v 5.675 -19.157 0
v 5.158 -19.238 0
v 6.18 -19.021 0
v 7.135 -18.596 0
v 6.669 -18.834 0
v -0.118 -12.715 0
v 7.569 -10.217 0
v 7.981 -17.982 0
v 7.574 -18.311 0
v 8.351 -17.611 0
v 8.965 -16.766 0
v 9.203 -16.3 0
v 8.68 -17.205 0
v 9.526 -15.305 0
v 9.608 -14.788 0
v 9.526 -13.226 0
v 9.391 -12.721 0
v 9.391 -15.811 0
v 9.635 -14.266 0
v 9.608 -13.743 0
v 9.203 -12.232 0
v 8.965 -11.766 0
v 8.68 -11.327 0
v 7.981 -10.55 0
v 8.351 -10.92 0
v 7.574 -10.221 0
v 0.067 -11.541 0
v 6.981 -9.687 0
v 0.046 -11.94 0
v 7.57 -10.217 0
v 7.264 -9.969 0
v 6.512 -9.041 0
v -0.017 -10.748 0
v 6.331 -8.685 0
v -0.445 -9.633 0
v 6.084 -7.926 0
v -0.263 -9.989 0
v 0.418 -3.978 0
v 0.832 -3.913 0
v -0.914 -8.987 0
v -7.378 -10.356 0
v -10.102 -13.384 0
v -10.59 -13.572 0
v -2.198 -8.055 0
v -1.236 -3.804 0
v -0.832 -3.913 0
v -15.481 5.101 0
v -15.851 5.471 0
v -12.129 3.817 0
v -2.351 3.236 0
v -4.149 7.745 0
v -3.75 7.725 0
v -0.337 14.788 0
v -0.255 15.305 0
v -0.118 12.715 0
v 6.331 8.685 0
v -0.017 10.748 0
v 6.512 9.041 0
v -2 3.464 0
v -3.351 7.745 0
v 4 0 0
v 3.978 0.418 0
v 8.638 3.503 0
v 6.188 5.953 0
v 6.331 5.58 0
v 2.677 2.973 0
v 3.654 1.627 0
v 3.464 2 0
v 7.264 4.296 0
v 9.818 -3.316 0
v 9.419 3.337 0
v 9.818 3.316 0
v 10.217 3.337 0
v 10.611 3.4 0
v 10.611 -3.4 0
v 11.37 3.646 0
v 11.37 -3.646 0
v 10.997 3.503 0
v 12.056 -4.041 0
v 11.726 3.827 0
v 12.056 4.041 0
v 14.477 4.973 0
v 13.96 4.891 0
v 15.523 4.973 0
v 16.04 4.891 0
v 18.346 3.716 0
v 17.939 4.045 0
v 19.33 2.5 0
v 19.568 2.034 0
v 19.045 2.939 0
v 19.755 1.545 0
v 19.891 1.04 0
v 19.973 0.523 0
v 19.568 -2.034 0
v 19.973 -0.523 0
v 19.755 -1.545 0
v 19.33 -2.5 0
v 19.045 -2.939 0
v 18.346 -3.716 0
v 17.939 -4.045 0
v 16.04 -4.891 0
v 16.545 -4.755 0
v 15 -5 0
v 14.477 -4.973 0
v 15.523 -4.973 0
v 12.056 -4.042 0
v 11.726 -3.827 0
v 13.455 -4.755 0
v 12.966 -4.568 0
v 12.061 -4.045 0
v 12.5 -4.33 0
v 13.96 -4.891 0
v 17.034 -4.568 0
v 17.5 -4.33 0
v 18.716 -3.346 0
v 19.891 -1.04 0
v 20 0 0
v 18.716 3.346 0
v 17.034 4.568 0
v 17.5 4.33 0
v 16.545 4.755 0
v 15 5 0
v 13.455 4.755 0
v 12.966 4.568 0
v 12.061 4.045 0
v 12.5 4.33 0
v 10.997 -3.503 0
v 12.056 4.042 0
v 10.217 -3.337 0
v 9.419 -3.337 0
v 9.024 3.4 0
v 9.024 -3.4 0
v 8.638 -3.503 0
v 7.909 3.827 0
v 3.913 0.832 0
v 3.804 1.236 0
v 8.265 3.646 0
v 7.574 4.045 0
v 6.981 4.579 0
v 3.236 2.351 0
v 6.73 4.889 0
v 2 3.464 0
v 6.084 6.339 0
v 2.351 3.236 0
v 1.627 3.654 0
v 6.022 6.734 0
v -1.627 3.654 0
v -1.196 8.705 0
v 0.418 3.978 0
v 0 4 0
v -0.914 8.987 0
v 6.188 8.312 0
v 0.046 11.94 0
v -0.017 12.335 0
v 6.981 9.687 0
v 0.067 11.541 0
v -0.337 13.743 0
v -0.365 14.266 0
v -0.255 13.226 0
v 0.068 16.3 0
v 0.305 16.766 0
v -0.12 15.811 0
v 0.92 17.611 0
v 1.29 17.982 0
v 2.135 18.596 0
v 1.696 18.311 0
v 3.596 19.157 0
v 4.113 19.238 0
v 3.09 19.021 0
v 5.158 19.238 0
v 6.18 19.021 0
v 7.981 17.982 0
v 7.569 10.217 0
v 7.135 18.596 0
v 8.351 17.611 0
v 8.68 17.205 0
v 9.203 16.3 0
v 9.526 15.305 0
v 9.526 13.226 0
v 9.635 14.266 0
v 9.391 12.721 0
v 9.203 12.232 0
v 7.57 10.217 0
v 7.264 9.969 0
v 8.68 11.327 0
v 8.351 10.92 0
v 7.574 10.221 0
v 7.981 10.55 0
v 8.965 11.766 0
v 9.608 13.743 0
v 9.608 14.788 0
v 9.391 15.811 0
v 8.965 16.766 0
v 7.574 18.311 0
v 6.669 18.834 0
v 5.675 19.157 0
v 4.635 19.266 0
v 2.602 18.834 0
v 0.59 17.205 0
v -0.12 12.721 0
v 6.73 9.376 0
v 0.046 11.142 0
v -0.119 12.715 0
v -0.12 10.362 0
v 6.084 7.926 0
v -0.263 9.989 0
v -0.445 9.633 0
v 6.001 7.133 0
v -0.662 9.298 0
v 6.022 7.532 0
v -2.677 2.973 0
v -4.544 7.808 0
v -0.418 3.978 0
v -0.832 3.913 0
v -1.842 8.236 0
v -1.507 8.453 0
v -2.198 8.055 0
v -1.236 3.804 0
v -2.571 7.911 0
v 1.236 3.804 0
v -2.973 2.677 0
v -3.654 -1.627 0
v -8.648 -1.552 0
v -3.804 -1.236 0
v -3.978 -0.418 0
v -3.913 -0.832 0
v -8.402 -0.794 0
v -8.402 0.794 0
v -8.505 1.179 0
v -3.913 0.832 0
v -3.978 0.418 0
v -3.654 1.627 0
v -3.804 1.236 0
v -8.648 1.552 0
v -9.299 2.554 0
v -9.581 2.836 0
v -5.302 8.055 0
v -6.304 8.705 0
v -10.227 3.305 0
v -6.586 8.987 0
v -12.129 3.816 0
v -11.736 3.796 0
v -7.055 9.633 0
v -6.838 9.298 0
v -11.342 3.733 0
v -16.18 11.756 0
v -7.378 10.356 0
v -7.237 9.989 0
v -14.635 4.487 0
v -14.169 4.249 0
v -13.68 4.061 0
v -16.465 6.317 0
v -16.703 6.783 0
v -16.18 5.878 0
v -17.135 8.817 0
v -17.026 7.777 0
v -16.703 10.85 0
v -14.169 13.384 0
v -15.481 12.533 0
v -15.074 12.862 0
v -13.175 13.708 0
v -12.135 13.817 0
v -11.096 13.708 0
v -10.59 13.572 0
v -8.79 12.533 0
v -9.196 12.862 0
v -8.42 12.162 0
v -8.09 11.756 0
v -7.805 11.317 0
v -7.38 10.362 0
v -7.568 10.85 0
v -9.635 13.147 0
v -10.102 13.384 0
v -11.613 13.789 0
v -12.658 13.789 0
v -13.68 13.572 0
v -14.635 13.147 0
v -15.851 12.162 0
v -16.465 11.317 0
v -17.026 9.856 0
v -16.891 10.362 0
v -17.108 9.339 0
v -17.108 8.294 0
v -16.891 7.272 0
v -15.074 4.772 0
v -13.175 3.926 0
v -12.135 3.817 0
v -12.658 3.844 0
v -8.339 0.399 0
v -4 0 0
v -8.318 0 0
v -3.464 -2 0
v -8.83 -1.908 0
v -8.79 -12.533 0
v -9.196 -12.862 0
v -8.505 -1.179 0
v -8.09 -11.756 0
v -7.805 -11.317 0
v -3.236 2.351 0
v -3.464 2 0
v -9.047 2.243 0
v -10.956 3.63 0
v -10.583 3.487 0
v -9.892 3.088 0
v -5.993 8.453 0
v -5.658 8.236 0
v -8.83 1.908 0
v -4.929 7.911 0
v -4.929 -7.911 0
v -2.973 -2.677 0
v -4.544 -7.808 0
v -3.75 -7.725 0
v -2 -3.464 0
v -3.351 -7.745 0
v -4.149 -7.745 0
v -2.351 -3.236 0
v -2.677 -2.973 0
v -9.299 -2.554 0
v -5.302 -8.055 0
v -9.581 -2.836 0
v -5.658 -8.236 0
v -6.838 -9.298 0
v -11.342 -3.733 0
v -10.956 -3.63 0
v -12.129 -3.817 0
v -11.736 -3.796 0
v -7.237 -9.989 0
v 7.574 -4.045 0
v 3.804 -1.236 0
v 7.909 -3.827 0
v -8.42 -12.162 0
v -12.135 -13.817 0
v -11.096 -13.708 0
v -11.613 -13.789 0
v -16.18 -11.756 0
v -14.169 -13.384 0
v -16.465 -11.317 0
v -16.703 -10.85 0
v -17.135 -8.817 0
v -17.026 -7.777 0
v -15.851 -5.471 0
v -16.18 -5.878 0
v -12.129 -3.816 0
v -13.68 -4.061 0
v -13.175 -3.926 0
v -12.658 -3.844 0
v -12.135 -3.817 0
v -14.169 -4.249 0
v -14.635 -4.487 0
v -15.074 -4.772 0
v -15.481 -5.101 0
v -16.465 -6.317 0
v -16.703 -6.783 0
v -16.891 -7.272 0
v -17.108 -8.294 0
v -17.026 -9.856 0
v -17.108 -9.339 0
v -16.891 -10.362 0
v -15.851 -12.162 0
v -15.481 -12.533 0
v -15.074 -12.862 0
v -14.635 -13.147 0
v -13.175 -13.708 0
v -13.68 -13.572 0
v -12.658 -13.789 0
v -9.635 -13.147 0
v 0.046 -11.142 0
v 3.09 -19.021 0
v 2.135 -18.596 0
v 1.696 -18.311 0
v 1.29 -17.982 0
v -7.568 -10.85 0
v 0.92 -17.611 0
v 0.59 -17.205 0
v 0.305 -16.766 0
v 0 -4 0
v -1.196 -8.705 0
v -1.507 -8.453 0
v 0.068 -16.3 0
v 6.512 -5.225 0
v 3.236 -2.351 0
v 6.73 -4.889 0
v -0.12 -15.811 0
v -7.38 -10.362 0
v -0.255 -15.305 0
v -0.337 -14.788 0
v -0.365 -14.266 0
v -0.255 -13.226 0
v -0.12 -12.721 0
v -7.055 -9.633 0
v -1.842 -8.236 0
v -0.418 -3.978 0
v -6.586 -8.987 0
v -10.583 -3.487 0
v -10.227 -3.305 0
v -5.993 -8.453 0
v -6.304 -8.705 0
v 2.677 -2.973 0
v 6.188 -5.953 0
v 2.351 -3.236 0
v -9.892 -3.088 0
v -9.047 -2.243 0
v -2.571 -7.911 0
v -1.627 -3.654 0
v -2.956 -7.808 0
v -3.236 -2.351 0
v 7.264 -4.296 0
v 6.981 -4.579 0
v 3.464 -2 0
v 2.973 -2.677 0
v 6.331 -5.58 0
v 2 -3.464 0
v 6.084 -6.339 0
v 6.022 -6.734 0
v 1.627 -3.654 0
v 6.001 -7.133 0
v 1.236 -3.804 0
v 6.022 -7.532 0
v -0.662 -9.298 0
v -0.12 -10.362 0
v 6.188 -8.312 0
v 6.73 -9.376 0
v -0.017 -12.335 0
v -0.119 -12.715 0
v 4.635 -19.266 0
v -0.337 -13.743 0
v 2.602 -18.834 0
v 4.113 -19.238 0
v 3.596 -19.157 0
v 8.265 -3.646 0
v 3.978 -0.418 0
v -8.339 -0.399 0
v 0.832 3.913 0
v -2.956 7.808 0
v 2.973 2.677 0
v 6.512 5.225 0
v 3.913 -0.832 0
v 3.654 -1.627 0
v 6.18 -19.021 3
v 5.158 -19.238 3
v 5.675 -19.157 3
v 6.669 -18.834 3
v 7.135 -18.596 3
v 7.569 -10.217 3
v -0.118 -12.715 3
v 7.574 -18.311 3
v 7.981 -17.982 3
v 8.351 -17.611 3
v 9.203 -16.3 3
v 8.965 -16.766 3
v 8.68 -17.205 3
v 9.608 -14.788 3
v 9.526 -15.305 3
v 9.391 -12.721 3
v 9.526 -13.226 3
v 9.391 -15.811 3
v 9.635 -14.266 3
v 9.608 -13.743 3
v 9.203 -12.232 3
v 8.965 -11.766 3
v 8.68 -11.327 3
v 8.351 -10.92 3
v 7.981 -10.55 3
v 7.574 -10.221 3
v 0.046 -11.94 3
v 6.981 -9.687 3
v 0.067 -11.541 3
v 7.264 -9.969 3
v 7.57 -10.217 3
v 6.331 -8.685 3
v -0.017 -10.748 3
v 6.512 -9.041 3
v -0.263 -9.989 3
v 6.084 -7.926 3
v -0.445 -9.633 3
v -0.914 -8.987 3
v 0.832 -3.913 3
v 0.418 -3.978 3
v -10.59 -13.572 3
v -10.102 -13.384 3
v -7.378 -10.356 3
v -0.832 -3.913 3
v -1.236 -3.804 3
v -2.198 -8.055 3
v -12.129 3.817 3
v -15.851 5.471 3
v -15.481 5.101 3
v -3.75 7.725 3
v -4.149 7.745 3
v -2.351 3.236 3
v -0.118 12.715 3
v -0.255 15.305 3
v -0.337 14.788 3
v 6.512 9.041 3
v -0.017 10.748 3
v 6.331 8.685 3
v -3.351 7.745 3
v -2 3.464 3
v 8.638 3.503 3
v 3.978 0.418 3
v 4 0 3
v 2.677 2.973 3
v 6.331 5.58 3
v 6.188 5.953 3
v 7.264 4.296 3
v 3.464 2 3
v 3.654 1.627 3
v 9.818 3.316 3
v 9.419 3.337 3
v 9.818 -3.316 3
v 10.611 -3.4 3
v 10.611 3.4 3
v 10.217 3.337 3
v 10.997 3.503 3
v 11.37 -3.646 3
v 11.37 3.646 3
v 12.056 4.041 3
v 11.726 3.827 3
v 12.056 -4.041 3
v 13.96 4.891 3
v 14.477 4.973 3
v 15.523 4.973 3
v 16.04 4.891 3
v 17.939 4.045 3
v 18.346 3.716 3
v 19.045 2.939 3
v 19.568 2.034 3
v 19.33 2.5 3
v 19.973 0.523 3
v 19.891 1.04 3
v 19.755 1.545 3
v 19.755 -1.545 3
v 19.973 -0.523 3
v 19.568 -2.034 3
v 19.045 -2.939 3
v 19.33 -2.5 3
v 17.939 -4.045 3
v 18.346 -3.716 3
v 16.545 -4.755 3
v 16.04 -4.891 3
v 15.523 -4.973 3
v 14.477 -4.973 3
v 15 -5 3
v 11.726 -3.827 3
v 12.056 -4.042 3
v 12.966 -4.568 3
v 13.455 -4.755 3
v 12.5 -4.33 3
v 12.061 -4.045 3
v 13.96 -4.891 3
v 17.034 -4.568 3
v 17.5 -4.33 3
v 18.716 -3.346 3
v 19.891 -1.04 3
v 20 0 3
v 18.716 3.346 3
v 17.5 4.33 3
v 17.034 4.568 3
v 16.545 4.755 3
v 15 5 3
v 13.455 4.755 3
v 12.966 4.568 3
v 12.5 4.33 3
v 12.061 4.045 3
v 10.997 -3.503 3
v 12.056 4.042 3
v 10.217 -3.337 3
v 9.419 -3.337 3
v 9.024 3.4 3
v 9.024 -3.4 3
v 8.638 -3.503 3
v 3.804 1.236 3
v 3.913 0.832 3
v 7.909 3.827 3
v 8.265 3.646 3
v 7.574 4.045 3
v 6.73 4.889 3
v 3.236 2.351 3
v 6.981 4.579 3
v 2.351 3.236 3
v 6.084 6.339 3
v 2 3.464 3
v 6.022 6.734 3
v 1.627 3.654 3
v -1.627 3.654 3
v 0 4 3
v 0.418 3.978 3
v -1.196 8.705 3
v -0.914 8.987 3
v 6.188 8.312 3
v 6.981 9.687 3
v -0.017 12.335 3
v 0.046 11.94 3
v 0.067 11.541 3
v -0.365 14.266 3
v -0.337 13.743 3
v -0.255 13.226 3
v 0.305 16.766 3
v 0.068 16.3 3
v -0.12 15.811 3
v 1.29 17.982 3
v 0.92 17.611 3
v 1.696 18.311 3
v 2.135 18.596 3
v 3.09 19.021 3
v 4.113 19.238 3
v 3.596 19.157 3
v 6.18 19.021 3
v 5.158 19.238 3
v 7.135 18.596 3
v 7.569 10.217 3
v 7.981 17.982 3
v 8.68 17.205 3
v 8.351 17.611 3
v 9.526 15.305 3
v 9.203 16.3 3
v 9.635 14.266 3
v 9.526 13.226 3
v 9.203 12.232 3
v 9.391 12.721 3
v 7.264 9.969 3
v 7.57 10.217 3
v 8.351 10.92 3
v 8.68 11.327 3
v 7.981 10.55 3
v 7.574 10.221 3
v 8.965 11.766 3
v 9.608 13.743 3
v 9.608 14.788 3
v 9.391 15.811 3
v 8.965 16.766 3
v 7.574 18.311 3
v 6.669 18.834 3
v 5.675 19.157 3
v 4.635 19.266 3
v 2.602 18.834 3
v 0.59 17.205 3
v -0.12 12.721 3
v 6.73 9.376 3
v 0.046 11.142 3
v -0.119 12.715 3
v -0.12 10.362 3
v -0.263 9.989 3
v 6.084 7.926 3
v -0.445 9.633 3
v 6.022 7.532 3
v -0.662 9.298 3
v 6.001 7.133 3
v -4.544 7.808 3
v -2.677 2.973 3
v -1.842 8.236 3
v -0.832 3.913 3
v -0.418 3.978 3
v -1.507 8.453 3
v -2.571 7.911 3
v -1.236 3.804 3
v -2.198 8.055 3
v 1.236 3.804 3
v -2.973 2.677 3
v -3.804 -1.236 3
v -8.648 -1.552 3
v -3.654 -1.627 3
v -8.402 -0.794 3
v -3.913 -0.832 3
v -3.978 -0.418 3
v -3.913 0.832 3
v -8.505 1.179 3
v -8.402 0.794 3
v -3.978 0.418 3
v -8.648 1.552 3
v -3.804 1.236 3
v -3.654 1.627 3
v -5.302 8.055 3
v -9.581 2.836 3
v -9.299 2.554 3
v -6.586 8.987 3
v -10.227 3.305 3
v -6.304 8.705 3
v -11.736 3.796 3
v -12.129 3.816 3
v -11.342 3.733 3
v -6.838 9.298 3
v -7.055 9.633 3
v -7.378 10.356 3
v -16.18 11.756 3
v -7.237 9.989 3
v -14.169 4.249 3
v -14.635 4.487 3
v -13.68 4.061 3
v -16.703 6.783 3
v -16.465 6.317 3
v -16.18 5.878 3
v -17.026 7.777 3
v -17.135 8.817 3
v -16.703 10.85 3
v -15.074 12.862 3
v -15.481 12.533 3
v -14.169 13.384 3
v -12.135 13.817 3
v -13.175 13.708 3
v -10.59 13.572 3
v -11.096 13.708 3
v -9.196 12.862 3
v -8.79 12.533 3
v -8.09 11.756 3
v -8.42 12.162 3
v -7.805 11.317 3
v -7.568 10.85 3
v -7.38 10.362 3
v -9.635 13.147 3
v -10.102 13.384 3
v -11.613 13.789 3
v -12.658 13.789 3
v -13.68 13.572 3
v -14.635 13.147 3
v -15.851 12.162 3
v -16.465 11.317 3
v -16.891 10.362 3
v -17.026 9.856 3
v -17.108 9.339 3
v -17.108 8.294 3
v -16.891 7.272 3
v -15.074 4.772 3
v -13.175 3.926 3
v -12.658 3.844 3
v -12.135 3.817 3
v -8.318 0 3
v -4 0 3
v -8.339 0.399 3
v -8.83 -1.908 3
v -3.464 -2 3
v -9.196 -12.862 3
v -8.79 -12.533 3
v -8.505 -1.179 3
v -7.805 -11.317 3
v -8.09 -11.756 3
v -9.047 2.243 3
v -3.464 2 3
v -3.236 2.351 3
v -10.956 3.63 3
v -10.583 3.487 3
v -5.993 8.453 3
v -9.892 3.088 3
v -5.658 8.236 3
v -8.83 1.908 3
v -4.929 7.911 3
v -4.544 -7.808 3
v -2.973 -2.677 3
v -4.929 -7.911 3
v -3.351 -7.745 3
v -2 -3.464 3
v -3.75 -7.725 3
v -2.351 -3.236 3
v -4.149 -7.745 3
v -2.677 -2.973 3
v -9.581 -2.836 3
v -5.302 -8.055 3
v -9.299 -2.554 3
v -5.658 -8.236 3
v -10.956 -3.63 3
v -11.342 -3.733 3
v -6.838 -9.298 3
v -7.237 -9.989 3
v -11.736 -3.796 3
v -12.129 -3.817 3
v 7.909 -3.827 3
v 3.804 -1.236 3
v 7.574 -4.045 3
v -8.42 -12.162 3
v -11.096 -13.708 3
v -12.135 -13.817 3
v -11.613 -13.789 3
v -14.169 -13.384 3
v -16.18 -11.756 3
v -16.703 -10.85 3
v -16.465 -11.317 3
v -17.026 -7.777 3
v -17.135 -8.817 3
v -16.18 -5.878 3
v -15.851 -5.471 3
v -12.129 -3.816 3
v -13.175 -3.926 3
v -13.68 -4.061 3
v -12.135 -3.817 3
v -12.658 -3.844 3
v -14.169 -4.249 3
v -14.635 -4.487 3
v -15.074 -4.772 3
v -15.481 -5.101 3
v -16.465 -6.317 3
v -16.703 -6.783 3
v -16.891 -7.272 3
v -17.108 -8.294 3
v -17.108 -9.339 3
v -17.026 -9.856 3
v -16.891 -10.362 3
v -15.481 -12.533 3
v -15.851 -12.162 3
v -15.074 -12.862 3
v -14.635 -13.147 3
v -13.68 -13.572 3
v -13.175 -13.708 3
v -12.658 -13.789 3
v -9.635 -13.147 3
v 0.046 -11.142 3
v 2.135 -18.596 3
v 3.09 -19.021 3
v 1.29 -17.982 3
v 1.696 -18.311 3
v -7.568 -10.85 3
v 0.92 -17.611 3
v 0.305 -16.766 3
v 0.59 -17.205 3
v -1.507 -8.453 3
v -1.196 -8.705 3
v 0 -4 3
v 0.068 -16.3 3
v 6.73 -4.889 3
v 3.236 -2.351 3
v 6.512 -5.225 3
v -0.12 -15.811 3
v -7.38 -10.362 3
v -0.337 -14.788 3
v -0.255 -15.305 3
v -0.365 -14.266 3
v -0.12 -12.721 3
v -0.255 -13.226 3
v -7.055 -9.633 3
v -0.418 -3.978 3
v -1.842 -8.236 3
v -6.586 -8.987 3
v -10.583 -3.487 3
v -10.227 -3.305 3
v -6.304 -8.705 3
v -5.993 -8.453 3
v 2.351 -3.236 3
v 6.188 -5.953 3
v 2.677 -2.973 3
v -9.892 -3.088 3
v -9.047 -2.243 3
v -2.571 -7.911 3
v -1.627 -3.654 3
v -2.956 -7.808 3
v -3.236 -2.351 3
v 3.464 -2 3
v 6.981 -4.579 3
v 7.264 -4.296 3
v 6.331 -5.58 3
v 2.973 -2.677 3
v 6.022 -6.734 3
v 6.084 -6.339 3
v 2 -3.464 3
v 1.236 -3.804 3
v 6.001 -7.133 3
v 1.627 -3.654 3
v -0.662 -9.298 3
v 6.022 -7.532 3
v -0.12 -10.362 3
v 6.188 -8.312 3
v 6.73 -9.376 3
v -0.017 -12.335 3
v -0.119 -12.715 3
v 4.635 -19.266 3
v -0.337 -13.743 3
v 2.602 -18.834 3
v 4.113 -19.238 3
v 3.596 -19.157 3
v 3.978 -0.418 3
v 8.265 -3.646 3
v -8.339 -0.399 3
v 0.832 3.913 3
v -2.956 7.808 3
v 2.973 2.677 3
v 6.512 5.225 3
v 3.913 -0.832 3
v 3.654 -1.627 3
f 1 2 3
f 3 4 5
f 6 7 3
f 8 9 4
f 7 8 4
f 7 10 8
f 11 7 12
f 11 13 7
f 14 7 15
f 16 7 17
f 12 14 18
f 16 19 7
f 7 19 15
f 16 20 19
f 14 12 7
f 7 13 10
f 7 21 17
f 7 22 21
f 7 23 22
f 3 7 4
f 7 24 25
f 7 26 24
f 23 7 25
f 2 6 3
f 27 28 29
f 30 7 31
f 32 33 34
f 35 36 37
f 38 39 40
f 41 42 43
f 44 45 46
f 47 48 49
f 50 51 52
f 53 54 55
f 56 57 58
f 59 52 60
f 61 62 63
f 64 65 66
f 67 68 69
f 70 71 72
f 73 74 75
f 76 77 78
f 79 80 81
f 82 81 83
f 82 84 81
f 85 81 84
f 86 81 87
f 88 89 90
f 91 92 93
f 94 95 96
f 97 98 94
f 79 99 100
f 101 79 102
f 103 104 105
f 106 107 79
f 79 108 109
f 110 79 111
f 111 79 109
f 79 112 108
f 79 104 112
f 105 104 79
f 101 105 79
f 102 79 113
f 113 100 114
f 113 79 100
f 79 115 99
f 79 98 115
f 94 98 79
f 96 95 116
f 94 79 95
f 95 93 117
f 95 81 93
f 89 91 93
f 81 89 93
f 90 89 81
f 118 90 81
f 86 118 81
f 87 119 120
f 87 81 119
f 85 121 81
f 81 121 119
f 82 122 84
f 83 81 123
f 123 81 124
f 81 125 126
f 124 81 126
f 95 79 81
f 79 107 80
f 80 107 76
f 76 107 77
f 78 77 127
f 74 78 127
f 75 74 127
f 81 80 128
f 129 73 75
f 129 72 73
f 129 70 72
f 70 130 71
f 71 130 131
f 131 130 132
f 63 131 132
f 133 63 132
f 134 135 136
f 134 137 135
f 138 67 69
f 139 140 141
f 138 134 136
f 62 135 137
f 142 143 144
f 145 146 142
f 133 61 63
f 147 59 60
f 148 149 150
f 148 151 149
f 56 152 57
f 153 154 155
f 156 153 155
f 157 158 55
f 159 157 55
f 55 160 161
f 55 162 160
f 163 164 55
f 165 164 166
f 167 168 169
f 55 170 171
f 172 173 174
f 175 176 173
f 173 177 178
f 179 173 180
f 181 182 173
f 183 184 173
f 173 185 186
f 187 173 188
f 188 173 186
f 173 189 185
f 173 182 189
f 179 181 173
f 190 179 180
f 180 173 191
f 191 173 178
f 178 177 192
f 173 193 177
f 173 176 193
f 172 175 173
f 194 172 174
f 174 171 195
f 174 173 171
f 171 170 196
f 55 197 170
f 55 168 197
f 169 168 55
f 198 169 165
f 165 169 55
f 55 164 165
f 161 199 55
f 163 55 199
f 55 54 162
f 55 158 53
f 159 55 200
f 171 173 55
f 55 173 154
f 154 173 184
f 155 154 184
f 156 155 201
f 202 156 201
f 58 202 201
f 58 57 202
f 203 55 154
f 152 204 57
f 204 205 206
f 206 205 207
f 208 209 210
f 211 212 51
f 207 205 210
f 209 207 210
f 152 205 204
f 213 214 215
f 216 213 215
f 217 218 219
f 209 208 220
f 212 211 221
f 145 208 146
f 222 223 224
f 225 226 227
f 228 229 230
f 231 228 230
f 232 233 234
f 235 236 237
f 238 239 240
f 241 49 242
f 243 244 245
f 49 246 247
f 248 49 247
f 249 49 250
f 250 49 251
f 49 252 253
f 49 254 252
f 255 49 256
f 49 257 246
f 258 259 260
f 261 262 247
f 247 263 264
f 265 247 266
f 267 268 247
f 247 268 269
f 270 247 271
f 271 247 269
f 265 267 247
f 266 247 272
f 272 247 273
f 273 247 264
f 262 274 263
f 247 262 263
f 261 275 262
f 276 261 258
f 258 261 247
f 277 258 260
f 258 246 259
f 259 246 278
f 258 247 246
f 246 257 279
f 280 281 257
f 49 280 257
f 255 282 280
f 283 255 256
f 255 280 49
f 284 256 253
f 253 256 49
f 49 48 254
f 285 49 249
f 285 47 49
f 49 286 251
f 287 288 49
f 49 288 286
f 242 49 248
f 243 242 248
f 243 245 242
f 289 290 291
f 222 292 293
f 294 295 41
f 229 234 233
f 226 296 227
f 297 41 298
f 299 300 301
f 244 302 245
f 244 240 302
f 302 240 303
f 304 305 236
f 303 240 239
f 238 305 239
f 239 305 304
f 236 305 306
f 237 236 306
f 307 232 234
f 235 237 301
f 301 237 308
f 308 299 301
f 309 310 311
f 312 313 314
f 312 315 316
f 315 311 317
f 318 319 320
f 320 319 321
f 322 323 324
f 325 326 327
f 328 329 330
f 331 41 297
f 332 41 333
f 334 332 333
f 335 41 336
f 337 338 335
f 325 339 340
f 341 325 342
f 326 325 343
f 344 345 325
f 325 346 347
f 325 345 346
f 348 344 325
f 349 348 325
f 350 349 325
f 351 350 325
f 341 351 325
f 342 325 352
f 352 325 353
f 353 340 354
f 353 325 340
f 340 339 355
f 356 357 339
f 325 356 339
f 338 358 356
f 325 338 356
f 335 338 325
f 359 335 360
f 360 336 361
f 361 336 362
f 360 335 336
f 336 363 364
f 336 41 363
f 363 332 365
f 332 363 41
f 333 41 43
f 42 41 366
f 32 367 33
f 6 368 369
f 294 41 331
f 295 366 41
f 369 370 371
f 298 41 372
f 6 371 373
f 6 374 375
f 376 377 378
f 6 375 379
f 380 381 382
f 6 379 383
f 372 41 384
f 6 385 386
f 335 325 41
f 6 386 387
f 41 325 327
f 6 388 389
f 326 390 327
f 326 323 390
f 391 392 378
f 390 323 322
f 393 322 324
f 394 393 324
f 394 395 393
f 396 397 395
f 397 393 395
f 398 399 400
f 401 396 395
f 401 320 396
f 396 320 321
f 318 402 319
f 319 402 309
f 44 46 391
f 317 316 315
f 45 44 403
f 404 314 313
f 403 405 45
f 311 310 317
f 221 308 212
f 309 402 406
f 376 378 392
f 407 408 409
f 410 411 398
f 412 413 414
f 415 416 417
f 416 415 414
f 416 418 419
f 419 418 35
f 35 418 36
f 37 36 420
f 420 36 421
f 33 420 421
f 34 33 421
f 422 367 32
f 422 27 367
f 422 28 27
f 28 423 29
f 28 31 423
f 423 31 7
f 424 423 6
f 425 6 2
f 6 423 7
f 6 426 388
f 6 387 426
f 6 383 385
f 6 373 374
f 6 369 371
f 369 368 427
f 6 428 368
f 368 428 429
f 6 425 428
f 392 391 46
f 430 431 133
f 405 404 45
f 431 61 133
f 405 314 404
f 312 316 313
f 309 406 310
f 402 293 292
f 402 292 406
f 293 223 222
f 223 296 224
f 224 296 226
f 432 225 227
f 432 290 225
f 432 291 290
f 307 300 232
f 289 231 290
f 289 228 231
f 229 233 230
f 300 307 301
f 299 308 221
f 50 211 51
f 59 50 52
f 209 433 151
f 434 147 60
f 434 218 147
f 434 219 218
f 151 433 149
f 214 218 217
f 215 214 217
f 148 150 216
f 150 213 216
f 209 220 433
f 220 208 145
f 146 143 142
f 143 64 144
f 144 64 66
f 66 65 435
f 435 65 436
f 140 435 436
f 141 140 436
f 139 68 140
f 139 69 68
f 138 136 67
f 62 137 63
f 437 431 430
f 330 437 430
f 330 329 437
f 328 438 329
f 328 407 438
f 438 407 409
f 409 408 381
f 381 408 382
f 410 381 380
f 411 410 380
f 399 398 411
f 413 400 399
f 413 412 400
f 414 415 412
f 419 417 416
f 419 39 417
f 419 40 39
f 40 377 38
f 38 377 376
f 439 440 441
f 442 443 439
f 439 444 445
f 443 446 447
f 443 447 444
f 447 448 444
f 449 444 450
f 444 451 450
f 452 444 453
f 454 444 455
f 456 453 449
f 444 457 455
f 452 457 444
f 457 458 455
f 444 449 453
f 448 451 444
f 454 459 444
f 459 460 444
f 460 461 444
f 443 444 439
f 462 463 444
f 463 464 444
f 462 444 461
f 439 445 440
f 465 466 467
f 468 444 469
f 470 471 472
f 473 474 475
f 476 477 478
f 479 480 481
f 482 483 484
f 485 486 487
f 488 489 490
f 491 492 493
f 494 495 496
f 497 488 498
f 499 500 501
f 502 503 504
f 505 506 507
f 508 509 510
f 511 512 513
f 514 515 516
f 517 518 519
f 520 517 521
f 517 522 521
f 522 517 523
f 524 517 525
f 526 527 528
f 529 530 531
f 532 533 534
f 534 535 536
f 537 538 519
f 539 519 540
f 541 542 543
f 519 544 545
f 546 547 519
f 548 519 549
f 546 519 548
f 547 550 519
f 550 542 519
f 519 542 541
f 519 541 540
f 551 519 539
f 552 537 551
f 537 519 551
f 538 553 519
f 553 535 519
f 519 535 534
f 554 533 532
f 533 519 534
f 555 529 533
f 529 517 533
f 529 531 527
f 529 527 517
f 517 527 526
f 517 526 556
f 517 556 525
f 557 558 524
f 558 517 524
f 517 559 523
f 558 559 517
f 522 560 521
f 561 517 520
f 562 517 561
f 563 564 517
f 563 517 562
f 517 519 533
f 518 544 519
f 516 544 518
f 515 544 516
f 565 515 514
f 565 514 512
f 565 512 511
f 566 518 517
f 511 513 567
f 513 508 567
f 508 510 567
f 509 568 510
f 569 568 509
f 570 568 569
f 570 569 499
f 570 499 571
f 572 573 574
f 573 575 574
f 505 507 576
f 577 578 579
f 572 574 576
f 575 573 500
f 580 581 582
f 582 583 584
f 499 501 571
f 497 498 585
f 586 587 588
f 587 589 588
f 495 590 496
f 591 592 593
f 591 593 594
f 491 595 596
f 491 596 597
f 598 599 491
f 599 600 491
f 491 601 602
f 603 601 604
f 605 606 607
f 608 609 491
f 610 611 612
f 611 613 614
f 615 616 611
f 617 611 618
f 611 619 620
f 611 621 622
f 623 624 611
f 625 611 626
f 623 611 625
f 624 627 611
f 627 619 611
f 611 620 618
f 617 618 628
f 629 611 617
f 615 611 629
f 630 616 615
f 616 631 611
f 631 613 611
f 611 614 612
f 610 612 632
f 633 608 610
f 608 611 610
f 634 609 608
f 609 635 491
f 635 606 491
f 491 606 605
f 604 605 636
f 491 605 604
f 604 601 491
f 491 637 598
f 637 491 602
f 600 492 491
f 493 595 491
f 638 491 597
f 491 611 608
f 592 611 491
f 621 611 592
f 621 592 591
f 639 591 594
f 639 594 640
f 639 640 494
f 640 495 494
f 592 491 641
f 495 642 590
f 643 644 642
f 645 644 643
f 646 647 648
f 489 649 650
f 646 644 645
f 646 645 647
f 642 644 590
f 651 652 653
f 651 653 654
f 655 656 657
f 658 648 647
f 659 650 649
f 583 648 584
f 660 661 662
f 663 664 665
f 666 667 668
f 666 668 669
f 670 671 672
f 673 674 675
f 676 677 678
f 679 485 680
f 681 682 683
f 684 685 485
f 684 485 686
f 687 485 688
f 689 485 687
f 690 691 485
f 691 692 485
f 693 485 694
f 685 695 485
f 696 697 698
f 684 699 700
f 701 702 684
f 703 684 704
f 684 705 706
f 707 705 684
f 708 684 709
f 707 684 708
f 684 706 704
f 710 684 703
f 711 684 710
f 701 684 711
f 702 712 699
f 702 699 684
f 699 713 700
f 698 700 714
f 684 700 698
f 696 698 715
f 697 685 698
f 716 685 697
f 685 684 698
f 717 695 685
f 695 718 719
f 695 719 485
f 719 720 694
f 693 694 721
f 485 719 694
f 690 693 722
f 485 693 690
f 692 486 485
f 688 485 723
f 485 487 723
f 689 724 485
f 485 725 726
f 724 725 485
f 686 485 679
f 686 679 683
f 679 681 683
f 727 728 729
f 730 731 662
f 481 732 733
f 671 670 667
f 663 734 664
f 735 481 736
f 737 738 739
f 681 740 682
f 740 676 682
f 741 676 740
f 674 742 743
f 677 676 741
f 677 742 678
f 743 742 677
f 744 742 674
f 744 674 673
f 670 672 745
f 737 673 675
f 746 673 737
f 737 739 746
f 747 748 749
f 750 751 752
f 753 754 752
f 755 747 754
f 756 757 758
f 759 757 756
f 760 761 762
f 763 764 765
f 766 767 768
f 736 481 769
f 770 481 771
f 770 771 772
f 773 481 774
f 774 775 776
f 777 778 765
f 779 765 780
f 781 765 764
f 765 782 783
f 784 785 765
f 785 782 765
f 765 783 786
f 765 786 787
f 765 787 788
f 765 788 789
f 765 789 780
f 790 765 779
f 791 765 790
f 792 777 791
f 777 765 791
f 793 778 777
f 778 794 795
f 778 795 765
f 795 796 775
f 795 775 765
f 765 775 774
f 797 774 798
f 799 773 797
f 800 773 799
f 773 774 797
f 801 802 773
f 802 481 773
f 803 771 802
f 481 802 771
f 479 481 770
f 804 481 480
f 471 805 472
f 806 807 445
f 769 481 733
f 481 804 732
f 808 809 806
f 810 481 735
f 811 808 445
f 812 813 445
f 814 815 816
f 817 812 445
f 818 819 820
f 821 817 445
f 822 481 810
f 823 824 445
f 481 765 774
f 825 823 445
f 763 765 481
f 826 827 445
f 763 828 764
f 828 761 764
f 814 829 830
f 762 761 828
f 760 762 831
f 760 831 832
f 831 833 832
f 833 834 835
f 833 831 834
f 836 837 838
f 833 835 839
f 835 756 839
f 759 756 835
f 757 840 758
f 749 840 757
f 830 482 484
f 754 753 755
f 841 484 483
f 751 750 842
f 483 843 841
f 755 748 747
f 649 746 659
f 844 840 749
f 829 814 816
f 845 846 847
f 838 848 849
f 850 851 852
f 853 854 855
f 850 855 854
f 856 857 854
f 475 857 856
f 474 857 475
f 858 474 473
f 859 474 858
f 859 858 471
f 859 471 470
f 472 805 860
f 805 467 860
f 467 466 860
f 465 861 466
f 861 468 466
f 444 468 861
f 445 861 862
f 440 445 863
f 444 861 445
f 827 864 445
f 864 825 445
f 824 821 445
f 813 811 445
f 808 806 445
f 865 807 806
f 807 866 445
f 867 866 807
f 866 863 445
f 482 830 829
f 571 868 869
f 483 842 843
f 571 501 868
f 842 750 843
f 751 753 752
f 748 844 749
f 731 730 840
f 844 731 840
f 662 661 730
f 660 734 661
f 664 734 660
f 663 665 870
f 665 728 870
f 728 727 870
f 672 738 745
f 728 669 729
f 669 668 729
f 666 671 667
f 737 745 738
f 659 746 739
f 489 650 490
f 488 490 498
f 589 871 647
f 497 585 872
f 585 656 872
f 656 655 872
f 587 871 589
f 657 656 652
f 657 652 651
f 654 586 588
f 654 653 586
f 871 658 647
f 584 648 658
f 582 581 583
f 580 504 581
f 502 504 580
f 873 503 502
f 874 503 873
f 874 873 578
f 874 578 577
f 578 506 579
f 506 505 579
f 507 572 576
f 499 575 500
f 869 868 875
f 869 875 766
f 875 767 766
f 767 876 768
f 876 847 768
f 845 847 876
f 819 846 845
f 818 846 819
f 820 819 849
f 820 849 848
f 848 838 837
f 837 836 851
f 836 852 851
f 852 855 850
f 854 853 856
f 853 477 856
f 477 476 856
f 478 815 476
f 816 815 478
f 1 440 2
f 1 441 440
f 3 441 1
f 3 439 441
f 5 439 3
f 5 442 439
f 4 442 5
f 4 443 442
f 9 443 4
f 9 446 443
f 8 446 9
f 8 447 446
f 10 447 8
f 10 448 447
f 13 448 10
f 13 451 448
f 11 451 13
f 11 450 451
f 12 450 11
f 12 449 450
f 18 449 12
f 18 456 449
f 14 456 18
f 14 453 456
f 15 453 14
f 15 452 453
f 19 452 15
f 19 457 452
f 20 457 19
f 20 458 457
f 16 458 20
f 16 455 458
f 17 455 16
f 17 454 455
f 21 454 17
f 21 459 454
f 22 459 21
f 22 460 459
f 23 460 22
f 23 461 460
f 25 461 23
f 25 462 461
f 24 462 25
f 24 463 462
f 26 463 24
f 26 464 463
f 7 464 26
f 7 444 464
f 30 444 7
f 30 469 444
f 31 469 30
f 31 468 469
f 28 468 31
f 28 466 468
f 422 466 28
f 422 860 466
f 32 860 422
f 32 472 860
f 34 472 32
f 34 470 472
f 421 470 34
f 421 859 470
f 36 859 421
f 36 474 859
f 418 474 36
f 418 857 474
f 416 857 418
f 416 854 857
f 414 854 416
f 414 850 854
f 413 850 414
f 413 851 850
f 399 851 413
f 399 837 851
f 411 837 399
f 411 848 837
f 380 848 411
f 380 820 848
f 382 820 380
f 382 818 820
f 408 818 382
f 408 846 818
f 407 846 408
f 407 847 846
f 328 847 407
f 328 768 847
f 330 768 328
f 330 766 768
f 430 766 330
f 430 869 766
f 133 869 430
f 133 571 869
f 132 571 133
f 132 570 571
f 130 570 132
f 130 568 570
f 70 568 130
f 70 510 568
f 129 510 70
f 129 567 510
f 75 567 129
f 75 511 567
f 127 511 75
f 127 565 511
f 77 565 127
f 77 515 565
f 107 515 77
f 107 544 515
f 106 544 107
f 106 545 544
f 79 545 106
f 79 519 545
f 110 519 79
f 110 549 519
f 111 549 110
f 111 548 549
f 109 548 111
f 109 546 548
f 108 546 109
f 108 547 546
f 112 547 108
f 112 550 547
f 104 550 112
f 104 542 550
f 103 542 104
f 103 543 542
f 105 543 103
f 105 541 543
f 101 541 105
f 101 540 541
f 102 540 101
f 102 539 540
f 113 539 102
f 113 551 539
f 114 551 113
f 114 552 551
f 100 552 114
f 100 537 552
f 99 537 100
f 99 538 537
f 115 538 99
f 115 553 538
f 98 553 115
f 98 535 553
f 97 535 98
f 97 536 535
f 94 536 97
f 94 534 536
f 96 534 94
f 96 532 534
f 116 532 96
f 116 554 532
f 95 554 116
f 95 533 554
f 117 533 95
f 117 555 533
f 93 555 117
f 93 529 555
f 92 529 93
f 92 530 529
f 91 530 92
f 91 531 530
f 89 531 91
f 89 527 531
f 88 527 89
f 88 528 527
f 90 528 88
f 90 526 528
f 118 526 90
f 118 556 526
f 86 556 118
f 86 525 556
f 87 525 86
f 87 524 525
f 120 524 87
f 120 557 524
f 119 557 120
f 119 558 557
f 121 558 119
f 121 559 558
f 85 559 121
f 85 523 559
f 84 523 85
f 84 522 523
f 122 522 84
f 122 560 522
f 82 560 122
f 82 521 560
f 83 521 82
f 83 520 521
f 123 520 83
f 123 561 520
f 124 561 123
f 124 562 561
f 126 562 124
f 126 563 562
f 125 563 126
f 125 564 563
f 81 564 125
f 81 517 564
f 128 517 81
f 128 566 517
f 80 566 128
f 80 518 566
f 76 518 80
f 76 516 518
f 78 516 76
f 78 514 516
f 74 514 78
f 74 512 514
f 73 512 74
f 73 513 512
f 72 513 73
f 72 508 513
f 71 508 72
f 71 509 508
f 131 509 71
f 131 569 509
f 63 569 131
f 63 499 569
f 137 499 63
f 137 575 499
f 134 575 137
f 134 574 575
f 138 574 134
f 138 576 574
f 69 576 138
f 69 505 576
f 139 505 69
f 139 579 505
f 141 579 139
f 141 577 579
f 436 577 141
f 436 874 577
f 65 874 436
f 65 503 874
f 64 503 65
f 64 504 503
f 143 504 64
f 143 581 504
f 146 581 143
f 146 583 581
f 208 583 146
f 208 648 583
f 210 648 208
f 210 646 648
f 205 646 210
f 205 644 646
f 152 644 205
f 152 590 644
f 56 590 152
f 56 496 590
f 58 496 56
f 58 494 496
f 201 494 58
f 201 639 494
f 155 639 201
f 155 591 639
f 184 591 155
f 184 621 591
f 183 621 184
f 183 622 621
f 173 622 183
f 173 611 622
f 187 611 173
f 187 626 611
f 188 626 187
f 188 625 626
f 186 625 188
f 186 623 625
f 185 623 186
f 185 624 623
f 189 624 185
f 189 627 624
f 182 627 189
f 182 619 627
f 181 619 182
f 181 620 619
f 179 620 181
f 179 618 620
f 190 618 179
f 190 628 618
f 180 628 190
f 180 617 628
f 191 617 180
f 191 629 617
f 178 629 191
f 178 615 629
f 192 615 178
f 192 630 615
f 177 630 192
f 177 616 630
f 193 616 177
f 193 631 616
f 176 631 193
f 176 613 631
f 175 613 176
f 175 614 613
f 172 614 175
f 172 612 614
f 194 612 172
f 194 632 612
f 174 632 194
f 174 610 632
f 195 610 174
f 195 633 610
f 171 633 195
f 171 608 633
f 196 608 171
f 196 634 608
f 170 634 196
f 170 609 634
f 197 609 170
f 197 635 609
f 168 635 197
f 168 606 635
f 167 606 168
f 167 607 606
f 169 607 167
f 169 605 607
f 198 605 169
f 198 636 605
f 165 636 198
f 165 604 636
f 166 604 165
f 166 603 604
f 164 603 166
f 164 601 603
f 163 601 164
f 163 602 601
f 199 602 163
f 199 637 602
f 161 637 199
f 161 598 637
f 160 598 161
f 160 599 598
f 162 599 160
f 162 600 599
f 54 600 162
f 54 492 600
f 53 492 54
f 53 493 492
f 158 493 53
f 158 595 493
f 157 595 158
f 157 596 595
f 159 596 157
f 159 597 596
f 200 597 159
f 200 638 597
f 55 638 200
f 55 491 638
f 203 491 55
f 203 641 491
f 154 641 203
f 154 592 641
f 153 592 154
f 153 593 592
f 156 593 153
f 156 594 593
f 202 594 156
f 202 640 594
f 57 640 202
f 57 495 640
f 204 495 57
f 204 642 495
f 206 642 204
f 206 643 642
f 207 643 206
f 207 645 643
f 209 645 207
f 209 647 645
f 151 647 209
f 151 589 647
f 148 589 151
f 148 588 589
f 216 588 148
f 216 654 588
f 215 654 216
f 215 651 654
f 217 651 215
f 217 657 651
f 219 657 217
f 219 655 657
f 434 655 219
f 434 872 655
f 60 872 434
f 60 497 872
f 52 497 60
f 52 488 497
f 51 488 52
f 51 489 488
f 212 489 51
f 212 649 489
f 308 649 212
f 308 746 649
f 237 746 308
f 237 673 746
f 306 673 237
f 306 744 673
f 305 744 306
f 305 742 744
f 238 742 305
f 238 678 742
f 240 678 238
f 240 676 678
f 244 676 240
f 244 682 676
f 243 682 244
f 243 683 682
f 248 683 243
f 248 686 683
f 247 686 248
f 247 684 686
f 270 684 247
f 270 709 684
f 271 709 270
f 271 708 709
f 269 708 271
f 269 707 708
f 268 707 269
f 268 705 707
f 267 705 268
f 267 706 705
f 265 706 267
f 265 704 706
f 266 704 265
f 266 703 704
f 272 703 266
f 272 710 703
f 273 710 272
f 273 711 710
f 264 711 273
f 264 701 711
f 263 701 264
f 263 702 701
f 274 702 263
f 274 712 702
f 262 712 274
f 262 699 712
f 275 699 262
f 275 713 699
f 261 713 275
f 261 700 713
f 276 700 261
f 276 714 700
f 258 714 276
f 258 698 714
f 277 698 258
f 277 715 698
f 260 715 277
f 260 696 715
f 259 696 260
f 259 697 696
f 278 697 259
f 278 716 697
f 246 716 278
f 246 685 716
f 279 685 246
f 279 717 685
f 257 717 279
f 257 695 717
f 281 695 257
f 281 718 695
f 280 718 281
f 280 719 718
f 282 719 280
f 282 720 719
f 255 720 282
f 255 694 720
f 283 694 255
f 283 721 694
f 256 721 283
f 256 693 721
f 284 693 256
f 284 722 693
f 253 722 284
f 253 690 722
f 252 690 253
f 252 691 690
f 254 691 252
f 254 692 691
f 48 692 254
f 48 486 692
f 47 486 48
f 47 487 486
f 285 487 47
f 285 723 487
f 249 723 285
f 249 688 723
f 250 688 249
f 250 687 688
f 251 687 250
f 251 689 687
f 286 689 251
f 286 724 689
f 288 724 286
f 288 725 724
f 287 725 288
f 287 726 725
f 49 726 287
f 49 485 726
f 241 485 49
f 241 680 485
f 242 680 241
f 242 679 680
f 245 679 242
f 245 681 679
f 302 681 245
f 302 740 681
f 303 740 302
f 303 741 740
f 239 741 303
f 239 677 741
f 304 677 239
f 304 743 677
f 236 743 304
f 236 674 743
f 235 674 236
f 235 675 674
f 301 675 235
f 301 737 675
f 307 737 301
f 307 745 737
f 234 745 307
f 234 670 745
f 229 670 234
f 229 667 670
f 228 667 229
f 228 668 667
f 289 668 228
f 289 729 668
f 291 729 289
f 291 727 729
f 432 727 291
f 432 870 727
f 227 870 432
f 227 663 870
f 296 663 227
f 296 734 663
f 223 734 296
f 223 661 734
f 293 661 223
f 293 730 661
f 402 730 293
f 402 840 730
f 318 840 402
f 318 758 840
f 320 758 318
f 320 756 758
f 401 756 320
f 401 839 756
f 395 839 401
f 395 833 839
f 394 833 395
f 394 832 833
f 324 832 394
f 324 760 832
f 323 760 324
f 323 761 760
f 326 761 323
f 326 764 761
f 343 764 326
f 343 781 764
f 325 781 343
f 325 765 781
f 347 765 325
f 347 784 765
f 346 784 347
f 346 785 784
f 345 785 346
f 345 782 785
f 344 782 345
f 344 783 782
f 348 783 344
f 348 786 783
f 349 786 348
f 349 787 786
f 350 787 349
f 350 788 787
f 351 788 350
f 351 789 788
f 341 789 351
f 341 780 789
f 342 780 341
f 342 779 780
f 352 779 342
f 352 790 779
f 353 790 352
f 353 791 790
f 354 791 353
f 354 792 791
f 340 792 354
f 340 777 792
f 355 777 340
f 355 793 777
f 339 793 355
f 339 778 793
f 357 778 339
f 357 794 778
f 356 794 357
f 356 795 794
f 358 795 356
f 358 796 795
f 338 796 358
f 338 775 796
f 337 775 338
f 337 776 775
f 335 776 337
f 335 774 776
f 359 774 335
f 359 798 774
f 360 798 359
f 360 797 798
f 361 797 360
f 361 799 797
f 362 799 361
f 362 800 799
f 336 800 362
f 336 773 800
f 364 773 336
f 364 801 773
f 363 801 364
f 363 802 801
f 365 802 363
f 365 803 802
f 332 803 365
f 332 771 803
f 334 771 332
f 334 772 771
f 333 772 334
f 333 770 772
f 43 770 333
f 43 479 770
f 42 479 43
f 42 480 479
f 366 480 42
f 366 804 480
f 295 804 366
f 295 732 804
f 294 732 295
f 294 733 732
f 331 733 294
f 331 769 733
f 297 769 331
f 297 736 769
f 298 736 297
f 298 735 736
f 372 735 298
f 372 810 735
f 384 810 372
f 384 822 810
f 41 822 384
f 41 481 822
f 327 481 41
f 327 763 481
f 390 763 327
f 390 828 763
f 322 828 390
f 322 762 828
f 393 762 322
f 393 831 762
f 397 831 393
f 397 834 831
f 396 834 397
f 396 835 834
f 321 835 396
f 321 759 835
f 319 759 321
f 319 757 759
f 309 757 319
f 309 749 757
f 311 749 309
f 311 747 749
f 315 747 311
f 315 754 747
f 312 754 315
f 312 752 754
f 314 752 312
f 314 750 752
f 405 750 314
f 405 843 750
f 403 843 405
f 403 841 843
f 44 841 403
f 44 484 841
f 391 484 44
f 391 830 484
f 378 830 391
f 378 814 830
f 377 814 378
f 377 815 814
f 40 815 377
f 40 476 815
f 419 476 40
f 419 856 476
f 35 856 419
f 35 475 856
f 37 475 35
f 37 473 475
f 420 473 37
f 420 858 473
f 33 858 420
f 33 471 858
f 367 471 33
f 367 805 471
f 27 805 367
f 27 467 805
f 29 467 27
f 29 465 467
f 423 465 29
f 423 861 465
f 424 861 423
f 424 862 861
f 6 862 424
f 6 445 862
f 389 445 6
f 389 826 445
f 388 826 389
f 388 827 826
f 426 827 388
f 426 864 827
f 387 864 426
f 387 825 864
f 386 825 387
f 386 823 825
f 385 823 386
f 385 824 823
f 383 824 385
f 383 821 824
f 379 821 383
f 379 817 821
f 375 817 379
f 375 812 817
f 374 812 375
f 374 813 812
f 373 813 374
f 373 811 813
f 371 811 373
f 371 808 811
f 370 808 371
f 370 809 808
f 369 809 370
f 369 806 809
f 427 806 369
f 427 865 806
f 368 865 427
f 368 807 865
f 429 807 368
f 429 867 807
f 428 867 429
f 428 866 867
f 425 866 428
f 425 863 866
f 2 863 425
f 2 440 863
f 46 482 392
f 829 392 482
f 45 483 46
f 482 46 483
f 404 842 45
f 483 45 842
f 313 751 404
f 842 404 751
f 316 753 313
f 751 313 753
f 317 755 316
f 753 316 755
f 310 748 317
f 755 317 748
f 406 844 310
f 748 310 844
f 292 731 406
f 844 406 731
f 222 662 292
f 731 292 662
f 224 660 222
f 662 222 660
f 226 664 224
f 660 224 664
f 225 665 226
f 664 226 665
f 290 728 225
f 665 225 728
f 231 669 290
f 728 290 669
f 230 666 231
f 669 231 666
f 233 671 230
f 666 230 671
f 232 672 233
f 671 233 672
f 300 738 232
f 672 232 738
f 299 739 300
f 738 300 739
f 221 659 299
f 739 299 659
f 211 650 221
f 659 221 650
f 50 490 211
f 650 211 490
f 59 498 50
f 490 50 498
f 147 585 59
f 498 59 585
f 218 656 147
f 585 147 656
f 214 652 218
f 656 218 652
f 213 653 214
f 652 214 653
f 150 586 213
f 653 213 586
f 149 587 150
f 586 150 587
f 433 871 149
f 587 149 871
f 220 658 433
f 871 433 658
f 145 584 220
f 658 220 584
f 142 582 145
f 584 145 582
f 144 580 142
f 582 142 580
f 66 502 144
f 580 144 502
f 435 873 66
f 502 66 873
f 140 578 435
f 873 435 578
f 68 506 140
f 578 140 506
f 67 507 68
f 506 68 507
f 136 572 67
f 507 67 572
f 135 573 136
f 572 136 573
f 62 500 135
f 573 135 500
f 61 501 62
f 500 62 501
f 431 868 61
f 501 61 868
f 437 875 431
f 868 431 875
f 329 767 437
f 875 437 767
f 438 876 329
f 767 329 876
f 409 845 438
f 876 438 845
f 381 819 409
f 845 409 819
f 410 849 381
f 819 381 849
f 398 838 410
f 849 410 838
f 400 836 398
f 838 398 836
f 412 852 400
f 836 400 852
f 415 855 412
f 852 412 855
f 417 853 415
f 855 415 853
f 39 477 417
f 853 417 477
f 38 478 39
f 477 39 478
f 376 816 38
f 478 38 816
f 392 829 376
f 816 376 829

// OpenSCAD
$fn=60;

linear_extrude(3) thumbScrewShape();

module thumbScrewShape(tips=5,outerDia=40,tipRad=5,drill=8){
  ang=360/tips;
  outRad=outerDia/2-tipRad;
  inRad=outRad*cos(ang/2);
  dist=outRad*sin(ang/2);
  nudRad=dist-tipRad;
  bodRad=sqrt(pow(inRad,2)+pow(nudRad,2));
  
  difference(){
    union(){
      for (ia=[0:ang:360-ang])
        rotate(ia) translate([outRad,0]) circle(tipRad);
     circle(bodRad);
    }
    for (ia=[0:ang:360-ang])
      color("red") rotate(ang/2+ia) translate([inRad,0]) circle(nudRad);
    circle(d=drill);
  }
}
